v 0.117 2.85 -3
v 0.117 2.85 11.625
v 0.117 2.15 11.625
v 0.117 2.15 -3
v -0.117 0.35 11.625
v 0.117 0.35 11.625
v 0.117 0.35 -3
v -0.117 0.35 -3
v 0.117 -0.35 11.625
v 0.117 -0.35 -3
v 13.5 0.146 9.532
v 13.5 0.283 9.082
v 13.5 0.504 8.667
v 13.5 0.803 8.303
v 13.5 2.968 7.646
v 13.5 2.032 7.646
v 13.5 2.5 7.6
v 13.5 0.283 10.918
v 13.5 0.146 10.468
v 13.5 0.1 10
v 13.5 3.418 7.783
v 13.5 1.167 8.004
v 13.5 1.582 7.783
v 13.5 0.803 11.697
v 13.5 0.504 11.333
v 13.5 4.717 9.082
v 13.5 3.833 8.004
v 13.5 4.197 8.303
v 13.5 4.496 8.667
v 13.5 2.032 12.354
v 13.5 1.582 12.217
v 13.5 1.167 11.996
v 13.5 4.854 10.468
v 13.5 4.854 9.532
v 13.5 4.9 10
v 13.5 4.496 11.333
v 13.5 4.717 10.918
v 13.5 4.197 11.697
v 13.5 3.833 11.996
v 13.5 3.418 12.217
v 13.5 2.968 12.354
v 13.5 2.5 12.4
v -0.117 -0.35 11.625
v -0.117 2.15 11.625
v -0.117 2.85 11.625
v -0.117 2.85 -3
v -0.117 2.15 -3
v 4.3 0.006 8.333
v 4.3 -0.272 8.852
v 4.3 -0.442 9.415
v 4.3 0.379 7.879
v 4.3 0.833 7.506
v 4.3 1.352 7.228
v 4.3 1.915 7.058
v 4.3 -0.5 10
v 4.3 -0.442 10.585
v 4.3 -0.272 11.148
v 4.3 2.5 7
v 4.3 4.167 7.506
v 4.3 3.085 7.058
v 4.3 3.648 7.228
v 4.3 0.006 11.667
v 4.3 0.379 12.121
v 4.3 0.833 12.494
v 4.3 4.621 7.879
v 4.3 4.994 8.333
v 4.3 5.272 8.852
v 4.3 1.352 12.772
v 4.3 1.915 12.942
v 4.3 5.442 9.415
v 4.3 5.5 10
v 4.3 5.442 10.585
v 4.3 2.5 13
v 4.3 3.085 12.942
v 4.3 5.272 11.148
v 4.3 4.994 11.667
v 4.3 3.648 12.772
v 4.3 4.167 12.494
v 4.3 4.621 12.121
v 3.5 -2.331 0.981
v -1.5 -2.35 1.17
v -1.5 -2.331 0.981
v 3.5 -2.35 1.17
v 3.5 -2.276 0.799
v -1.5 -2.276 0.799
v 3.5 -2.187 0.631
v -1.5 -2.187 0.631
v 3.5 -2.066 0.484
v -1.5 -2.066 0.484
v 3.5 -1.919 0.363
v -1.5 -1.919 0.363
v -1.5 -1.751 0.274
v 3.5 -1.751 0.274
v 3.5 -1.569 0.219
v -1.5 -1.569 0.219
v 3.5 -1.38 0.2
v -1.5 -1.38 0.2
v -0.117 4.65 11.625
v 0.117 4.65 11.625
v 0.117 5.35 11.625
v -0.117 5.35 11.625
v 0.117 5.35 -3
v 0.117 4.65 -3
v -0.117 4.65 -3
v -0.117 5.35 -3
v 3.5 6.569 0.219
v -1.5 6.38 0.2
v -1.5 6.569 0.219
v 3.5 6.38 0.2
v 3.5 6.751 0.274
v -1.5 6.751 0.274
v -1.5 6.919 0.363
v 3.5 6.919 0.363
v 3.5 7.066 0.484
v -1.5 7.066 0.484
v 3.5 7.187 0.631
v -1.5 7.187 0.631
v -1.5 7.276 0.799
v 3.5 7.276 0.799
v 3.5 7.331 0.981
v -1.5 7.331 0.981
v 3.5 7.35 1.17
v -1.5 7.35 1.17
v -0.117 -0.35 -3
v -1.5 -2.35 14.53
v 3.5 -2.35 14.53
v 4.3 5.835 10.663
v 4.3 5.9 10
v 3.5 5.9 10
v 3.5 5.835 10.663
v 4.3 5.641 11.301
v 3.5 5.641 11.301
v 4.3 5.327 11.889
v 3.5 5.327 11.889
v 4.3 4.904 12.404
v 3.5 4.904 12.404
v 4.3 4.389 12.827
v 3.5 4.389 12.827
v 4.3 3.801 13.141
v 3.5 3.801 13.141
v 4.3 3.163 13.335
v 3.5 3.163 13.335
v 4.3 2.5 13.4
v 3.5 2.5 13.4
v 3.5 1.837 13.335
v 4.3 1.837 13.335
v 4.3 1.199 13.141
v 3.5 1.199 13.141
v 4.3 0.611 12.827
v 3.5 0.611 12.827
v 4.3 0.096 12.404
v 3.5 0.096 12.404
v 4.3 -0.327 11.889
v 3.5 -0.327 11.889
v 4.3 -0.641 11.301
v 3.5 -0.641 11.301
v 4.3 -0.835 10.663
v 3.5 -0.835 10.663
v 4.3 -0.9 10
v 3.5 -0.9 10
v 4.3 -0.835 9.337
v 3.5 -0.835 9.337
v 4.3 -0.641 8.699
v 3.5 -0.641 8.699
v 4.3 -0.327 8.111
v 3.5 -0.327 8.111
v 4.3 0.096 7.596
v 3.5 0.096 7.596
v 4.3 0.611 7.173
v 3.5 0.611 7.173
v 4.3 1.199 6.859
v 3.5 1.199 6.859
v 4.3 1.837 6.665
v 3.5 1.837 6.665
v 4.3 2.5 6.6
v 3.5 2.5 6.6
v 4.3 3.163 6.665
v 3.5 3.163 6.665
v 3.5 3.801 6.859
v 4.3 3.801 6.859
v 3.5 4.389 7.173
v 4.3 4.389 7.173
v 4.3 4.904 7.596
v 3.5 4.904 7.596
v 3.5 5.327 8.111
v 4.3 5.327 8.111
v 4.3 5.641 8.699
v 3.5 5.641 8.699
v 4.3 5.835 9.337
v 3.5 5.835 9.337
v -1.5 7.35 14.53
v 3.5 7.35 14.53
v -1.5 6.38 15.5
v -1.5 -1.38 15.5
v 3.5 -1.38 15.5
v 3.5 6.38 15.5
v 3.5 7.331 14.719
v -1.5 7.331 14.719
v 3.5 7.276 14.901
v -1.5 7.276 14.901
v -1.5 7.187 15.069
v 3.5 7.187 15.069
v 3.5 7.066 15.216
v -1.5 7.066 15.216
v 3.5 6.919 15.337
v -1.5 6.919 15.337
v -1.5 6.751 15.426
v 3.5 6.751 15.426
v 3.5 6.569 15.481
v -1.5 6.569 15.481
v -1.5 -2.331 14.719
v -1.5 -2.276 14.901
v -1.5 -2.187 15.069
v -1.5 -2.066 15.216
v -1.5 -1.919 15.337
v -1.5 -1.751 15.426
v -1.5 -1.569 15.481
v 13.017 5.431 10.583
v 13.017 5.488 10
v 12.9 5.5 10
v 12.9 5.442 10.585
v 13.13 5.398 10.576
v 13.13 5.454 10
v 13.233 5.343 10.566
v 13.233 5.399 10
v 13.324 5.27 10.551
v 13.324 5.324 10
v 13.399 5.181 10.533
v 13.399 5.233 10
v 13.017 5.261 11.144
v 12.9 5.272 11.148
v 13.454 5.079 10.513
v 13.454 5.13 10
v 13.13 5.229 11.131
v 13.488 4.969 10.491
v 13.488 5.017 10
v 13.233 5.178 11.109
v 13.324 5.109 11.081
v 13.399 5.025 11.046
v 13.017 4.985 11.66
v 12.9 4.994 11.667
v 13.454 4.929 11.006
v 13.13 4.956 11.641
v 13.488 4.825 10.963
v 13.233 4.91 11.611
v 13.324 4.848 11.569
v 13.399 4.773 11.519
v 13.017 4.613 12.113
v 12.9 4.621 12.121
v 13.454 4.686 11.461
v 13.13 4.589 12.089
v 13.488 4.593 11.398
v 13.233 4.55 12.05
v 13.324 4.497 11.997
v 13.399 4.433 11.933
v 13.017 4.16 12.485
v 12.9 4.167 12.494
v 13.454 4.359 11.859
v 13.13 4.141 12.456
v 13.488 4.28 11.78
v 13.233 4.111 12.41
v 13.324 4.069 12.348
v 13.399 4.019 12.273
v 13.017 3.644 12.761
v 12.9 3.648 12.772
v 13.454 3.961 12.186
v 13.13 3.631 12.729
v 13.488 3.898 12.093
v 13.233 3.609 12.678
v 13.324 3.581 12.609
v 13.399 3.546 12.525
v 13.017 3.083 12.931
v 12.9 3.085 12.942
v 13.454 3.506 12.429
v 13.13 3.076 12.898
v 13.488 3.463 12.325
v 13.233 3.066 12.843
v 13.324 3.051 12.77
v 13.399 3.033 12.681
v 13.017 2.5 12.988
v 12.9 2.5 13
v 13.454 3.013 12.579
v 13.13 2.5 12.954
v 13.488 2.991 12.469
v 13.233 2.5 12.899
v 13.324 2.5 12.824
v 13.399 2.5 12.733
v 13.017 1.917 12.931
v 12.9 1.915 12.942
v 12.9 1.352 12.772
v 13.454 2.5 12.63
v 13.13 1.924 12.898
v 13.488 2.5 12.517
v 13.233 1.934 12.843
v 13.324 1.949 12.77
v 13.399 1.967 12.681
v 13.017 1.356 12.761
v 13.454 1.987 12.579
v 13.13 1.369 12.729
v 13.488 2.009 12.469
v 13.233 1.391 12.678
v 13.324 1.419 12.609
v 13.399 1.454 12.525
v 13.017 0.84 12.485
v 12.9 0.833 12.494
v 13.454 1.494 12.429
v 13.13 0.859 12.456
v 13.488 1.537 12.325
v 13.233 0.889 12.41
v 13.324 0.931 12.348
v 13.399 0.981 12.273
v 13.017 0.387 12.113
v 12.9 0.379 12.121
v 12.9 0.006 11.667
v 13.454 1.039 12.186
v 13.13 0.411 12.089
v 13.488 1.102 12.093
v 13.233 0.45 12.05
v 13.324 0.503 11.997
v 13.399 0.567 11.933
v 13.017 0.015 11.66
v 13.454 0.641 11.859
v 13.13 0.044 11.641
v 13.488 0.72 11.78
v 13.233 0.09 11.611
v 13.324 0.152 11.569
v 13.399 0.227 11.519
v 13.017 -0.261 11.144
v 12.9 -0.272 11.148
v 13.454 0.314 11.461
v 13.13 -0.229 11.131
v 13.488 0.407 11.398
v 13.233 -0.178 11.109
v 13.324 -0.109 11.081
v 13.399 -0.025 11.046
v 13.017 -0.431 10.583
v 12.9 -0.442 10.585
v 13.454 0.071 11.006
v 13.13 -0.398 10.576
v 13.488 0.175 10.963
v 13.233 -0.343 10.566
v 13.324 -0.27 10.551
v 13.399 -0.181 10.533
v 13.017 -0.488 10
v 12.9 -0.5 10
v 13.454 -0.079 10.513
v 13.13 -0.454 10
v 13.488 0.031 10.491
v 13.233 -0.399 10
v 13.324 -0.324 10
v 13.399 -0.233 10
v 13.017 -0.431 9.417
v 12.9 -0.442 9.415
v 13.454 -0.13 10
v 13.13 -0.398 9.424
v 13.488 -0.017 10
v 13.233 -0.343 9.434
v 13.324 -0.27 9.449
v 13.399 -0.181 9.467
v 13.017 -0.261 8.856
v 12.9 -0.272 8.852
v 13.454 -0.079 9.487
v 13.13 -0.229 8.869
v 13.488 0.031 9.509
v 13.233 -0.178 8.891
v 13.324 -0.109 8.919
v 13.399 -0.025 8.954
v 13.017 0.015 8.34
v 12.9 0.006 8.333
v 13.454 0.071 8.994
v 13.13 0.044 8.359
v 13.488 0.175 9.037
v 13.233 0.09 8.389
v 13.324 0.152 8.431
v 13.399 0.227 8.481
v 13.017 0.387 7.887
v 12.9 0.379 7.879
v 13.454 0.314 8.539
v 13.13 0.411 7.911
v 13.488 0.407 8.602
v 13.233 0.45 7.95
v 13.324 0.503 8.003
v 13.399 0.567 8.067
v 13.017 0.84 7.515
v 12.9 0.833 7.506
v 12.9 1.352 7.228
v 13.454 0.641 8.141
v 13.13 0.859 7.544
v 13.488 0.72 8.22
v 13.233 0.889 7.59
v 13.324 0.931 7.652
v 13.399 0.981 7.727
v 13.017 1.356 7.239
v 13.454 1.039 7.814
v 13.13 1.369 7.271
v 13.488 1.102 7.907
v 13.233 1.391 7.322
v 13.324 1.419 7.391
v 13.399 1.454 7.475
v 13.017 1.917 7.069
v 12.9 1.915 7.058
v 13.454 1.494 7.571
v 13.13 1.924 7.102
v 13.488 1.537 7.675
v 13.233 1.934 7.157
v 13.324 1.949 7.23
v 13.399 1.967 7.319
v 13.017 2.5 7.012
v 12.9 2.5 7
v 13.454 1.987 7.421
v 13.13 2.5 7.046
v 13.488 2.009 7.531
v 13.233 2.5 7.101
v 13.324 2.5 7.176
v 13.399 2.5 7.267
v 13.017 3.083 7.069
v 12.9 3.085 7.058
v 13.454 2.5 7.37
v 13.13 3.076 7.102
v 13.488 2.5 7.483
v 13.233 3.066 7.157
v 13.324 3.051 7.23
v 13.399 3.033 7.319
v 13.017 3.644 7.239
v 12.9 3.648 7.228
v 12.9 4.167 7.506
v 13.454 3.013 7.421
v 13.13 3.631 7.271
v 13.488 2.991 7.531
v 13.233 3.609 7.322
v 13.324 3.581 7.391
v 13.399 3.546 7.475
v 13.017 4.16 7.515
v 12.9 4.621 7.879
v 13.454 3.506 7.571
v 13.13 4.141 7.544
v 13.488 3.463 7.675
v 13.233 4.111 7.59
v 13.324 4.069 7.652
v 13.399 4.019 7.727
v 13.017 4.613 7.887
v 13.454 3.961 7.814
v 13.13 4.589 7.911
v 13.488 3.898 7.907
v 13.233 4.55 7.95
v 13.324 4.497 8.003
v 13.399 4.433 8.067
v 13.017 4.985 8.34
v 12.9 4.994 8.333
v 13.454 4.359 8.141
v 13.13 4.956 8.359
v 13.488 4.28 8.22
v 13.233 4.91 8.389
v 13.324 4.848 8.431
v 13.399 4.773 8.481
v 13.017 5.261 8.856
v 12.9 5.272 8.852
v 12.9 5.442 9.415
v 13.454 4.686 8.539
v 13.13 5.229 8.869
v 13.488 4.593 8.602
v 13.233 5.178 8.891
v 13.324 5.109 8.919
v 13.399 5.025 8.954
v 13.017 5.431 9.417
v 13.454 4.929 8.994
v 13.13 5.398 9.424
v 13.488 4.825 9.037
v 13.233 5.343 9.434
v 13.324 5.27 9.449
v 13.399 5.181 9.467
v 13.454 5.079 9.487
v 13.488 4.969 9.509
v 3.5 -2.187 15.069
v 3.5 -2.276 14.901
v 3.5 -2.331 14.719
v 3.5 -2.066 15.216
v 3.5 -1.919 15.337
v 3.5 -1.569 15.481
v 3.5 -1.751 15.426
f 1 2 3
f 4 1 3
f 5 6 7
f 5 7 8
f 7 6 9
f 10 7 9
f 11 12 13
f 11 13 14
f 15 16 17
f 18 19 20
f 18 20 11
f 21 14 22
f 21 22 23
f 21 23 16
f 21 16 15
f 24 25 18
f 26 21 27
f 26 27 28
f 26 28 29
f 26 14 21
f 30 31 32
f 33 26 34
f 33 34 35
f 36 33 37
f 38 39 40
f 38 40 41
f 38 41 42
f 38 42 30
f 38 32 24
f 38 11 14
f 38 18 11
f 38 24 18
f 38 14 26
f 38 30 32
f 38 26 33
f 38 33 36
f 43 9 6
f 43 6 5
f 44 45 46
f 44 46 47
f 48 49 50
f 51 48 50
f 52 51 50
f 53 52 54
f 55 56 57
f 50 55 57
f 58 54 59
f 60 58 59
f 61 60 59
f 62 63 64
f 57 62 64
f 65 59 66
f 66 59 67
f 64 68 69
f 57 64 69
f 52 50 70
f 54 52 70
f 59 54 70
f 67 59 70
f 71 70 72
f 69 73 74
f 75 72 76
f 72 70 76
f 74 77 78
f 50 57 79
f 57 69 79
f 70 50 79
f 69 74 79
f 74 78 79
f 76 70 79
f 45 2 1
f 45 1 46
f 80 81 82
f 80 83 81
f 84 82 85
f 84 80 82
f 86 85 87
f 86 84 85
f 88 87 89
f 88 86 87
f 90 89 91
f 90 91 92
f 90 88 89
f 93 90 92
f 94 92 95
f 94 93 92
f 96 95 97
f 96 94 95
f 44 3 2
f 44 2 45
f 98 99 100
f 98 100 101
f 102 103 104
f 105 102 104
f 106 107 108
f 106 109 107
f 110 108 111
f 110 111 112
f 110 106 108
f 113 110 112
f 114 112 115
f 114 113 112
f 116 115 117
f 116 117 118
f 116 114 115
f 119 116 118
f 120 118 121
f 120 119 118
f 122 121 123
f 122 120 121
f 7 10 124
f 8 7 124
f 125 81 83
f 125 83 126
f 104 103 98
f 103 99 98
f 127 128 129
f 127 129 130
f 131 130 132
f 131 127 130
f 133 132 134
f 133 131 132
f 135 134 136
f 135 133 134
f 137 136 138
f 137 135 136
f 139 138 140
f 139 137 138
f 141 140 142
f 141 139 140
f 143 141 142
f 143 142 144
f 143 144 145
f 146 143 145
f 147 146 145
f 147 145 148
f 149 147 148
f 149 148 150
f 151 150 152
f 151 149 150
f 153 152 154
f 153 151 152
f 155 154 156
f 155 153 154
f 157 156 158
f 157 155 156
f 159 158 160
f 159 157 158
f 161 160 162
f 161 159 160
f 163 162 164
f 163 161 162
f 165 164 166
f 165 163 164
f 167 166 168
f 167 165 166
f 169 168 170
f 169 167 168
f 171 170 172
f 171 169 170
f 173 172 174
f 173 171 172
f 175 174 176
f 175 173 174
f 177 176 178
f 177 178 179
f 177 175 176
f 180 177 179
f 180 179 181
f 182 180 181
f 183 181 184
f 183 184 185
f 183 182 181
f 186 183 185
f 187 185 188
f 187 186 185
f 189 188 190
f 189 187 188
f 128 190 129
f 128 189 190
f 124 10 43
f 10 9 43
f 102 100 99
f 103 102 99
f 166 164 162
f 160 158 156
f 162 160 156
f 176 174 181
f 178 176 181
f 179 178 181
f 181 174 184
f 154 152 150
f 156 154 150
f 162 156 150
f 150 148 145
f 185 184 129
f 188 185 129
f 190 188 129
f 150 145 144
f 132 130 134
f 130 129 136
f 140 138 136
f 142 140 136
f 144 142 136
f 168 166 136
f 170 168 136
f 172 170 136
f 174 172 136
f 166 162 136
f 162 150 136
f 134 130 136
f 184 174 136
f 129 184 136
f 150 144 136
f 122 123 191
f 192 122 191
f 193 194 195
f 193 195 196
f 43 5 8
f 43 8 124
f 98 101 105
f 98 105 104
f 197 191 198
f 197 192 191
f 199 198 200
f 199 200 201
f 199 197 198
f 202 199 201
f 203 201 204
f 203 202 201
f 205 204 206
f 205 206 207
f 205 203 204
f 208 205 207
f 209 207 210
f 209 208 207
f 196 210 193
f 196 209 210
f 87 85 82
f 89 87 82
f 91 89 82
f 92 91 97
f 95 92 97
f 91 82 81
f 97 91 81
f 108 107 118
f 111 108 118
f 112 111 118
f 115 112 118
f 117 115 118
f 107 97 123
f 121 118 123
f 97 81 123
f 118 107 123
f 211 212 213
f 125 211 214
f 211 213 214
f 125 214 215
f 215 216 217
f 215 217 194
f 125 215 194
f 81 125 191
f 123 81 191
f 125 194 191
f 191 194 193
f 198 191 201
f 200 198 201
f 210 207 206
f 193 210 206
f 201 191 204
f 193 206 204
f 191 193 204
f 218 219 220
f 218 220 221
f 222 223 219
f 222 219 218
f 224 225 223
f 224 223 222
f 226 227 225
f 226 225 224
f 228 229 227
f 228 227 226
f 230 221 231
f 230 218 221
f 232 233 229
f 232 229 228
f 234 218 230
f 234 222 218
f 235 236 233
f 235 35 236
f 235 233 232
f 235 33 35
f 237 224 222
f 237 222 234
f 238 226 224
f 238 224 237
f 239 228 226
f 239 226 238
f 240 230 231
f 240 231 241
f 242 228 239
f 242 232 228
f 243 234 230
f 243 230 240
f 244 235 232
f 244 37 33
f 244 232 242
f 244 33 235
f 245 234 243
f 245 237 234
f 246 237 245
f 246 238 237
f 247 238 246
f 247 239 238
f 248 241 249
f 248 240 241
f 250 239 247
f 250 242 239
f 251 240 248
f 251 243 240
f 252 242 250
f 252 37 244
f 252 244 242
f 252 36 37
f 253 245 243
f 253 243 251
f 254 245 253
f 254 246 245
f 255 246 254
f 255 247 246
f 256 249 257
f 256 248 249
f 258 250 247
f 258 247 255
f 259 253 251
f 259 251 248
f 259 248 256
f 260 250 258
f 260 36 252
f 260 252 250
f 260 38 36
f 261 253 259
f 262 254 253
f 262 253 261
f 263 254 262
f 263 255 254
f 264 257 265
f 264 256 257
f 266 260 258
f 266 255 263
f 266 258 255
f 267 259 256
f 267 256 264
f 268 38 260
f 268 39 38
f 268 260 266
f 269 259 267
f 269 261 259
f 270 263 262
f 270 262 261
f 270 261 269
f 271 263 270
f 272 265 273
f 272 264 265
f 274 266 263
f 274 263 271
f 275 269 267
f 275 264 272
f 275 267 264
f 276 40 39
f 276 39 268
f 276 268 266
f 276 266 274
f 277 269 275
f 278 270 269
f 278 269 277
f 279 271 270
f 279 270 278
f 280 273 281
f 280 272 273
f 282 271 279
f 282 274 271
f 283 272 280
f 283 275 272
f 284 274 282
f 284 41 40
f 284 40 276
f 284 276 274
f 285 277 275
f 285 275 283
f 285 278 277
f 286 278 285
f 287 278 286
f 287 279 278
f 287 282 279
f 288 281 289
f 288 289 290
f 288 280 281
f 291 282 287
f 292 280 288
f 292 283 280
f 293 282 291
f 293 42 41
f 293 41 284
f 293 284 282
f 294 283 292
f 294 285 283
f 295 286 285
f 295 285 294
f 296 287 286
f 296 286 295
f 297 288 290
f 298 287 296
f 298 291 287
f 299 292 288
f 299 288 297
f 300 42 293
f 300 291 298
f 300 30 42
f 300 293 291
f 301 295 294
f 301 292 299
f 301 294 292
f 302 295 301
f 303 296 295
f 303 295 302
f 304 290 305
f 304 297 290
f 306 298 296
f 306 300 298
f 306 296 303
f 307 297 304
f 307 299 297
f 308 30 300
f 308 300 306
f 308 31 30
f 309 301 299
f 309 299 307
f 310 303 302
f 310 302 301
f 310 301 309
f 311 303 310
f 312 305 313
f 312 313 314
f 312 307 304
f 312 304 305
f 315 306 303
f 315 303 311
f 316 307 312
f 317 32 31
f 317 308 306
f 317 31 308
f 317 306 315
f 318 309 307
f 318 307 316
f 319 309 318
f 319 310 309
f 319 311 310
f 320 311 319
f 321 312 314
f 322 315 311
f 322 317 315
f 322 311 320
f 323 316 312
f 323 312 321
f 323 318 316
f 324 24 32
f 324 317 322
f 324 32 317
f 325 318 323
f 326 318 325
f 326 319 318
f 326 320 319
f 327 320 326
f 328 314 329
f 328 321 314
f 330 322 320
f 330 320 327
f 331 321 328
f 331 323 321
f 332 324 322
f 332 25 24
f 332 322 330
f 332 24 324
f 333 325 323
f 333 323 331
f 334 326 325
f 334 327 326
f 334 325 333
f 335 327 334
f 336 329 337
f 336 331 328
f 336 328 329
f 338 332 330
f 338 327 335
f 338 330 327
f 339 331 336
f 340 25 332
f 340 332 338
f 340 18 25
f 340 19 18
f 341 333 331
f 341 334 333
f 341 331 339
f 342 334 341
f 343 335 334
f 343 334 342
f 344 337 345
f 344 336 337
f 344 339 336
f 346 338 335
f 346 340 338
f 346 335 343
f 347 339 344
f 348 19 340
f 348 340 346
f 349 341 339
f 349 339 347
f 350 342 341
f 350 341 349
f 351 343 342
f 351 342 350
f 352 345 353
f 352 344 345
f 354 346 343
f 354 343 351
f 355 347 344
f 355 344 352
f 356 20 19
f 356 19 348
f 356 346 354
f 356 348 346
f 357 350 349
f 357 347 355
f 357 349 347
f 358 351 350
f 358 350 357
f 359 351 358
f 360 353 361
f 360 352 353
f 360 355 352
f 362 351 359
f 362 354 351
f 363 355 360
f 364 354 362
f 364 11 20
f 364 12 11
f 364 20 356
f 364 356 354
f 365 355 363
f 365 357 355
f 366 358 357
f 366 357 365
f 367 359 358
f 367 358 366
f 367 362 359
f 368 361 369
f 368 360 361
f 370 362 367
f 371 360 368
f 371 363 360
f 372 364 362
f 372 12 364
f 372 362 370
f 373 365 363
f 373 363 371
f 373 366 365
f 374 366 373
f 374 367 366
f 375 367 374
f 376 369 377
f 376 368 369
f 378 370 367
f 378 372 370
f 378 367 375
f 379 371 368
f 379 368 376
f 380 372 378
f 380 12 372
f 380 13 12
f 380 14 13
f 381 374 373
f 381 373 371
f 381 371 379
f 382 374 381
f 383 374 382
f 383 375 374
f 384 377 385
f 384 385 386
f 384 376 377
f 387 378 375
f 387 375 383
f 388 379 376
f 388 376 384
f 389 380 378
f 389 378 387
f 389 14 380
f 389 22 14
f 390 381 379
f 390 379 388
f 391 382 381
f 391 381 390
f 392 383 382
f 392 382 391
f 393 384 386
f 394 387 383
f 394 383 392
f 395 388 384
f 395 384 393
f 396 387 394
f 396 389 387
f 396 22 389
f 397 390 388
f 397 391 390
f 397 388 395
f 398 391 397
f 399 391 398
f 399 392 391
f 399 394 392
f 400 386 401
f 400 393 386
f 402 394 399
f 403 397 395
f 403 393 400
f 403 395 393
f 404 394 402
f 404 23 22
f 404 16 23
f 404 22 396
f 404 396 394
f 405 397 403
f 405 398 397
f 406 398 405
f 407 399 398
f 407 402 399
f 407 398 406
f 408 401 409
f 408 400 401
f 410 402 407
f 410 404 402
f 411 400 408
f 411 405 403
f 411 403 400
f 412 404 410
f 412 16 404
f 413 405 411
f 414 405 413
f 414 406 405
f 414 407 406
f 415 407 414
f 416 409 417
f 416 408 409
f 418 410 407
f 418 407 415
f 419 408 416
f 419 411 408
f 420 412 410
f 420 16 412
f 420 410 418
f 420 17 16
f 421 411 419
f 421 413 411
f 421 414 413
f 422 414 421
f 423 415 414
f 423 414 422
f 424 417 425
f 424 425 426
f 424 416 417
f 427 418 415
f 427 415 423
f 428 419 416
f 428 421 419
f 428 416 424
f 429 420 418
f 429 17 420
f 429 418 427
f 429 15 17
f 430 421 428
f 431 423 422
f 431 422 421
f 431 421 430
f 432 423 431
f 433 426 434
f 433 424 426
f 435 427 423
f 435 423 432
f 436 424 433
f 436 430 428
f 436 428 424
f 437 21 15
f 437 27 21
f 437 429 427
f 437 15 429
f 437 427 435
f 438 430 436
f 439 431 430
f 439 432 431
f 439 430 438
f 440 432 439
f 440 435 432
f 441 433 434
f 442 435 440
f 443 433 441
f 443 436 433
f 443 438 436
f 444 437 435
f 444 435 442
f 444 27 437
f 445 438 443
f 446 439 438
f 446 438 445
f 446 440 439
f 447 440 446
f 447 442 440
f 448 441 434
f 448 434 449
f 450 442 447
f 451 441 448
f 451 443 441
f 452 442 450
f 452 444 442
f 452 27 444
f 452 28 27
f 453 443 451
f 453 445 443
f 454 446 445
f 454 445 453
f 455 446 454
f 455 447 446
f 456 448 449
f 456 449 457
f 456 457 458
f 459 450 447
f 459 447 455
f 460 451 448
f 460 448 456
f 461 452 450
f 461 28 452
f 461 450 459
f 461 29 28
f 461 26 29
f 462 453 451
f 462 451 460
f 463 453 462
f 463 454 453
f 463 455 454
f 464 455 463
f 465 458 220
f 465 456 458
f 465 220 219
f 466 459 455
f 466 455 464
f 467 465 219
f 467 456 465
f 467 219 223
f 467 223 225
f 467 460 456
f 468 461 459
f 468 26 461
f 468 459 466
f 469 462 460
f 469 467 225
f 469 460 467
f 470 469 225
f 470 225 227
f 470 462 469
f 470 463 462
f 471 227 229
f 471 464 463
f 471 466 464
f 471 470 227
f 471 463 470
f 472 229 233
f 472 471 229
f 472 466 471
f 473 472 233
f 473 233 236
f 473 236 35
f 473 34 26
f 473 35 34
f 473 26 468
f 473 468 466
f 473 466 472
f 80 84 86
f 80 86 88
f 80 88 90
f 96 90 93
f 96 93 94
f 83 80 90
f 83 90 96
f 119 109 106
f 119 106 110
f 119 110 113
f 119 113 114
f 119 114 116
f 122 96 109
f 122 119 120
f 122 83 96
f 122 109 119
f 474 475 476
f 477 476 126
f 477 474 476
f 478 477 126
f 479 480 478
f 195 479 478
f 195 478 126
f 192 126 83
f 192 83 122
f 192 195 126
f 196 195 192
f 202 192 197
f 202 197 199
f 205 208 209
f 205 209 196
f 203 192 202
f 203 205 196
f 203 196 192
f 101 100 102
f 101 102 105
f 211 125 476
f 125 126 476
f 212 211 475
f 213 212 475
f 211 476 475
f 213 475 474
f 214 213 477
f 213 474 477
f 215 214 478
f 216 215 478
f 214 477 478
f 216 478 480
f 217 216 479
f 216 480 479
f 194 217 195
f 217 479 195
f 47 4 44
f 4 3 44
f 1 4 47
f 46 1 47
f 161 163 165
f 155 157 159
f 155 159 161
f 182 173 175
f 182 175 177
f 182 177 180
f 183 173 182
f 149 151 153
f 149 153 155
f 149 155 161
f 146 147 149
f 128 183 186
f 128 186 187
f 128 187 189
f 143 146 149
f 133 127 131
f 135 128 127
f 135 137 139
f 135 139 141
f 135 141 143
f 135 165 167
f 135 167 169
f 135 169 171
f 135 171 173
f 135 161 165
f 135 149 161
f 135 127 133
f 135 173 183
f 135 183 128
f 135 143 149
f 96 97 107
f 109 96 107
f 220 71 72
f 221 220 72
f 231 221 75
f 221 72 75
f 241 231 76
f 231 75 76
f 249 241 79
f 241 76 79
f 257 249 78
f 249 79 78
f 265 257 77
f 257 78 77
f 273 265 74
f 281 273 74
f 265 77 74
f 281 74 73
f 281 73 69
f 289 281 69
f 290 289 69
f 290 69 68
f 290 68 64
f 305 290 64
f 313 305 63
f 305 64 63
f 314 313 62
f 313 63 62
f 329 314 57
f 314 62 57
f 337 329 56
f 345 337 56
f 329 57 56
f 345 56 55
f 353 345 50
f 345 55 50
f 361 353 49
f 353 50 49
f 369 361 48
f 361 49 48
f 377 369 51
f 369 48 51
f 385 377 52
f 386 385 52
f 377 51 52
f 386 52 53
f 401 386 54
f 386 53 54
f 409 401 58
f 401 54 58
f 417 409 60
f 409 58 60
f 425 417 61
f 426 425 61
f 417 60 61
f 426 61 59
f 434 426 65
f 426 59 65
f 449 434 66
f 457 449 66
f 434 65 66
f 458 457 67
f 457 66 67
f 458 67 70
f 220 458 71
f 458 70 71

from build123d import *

# Parameters (mm, degrees)
SKETCH001_R       = 3.4
PAD001_DEPTH      = 0.8
SKETCH003_W       = 0.233334
SKETCH003_H       = 0.7
PAD002_DEPTH      = 11.625
PAD002_DEPTH_BACK = 3
SKETCH004_R       = 3
PAD003_DEPTH      = 9.2
FILLET_R          = 0.6
SKETCH_W          = 9.7
SKETCH_H          = 15.3
PAD_DEPTH         = 5
FILLET001_R       = 0.97


with BuildPart() as pad001:
    # Sketch001 → Pad001 (new body)
    with BuildSketch(Plane.YZ.offset(4.3)):
        with Locations((2.5, 10)):
            Circle(SKETCH001_R)
    extrude(amount=-PAD001_DEPTH)


with BuildPart() as pad002:
    # Sketch003 → Pad002 (new body, two sides)
    with BuildSketch(Plane(origin=(0, 0, 0), x_dir=(-1, 0, 0), z_dir=(0, 0, 1))) as pad002_sk:
        Rectangle(SKETCH003_W, SKETCH003_H)
        with Locations((0, -2.5)):
            Rectangle(SKETCH003_W, SKETCH003_H)
        with Locations((0, -5)):
            Rectangle(SKETCH003_W, SKETCH003_H)
    extrude(amount=PAD002_DEPTH)
    extrude(pad002_sk.sketch, amount=-PAD002_DEPTH_BACK)


with BuildPart() as fillet_body:
    # Sketch004 → Pad003 (new body)
    with BuildSketch(Plane.YZ.offset(4.3)):
        with Locations((2.5, 10)):
            Circle(SKETCH004_R)
    extrude(amount=PAD003_DEPTH)

    # Fillet
    fillet_edges = [fillet_body.edges().sort_by_distance(p)[0] for p in [
        (13.5, -0.5, 10),
    ]]
    fillet(fillet_edges, radius=FILLET_R)


with BuildPart() as fillet001:
    # Sketch → Pad (new body)
    with BuildSketch(Plane.YZ.offset(-1.5)):
        with Locations((2.5, 7.85)):
            Rectangle(SKETCH_W, SKETCH_H)
    extrude(amount=PAD_DEPTH)

    # Fillet001
    fillet001_edges = [fillet001.edges().sort_by_distance(p)[0] for p in [
        (1, -2.35, 15.5),
        (1, 7.35, 15.5),
        (1, -2.35, 0.2),
        (1, 7.35, 0.2),
    ]]
    fillet(fillet001_edges, radius=FILLET001_R)


solid = Compound([pad001.part, pad002.part, fillet_body.part, fillet001.part])
